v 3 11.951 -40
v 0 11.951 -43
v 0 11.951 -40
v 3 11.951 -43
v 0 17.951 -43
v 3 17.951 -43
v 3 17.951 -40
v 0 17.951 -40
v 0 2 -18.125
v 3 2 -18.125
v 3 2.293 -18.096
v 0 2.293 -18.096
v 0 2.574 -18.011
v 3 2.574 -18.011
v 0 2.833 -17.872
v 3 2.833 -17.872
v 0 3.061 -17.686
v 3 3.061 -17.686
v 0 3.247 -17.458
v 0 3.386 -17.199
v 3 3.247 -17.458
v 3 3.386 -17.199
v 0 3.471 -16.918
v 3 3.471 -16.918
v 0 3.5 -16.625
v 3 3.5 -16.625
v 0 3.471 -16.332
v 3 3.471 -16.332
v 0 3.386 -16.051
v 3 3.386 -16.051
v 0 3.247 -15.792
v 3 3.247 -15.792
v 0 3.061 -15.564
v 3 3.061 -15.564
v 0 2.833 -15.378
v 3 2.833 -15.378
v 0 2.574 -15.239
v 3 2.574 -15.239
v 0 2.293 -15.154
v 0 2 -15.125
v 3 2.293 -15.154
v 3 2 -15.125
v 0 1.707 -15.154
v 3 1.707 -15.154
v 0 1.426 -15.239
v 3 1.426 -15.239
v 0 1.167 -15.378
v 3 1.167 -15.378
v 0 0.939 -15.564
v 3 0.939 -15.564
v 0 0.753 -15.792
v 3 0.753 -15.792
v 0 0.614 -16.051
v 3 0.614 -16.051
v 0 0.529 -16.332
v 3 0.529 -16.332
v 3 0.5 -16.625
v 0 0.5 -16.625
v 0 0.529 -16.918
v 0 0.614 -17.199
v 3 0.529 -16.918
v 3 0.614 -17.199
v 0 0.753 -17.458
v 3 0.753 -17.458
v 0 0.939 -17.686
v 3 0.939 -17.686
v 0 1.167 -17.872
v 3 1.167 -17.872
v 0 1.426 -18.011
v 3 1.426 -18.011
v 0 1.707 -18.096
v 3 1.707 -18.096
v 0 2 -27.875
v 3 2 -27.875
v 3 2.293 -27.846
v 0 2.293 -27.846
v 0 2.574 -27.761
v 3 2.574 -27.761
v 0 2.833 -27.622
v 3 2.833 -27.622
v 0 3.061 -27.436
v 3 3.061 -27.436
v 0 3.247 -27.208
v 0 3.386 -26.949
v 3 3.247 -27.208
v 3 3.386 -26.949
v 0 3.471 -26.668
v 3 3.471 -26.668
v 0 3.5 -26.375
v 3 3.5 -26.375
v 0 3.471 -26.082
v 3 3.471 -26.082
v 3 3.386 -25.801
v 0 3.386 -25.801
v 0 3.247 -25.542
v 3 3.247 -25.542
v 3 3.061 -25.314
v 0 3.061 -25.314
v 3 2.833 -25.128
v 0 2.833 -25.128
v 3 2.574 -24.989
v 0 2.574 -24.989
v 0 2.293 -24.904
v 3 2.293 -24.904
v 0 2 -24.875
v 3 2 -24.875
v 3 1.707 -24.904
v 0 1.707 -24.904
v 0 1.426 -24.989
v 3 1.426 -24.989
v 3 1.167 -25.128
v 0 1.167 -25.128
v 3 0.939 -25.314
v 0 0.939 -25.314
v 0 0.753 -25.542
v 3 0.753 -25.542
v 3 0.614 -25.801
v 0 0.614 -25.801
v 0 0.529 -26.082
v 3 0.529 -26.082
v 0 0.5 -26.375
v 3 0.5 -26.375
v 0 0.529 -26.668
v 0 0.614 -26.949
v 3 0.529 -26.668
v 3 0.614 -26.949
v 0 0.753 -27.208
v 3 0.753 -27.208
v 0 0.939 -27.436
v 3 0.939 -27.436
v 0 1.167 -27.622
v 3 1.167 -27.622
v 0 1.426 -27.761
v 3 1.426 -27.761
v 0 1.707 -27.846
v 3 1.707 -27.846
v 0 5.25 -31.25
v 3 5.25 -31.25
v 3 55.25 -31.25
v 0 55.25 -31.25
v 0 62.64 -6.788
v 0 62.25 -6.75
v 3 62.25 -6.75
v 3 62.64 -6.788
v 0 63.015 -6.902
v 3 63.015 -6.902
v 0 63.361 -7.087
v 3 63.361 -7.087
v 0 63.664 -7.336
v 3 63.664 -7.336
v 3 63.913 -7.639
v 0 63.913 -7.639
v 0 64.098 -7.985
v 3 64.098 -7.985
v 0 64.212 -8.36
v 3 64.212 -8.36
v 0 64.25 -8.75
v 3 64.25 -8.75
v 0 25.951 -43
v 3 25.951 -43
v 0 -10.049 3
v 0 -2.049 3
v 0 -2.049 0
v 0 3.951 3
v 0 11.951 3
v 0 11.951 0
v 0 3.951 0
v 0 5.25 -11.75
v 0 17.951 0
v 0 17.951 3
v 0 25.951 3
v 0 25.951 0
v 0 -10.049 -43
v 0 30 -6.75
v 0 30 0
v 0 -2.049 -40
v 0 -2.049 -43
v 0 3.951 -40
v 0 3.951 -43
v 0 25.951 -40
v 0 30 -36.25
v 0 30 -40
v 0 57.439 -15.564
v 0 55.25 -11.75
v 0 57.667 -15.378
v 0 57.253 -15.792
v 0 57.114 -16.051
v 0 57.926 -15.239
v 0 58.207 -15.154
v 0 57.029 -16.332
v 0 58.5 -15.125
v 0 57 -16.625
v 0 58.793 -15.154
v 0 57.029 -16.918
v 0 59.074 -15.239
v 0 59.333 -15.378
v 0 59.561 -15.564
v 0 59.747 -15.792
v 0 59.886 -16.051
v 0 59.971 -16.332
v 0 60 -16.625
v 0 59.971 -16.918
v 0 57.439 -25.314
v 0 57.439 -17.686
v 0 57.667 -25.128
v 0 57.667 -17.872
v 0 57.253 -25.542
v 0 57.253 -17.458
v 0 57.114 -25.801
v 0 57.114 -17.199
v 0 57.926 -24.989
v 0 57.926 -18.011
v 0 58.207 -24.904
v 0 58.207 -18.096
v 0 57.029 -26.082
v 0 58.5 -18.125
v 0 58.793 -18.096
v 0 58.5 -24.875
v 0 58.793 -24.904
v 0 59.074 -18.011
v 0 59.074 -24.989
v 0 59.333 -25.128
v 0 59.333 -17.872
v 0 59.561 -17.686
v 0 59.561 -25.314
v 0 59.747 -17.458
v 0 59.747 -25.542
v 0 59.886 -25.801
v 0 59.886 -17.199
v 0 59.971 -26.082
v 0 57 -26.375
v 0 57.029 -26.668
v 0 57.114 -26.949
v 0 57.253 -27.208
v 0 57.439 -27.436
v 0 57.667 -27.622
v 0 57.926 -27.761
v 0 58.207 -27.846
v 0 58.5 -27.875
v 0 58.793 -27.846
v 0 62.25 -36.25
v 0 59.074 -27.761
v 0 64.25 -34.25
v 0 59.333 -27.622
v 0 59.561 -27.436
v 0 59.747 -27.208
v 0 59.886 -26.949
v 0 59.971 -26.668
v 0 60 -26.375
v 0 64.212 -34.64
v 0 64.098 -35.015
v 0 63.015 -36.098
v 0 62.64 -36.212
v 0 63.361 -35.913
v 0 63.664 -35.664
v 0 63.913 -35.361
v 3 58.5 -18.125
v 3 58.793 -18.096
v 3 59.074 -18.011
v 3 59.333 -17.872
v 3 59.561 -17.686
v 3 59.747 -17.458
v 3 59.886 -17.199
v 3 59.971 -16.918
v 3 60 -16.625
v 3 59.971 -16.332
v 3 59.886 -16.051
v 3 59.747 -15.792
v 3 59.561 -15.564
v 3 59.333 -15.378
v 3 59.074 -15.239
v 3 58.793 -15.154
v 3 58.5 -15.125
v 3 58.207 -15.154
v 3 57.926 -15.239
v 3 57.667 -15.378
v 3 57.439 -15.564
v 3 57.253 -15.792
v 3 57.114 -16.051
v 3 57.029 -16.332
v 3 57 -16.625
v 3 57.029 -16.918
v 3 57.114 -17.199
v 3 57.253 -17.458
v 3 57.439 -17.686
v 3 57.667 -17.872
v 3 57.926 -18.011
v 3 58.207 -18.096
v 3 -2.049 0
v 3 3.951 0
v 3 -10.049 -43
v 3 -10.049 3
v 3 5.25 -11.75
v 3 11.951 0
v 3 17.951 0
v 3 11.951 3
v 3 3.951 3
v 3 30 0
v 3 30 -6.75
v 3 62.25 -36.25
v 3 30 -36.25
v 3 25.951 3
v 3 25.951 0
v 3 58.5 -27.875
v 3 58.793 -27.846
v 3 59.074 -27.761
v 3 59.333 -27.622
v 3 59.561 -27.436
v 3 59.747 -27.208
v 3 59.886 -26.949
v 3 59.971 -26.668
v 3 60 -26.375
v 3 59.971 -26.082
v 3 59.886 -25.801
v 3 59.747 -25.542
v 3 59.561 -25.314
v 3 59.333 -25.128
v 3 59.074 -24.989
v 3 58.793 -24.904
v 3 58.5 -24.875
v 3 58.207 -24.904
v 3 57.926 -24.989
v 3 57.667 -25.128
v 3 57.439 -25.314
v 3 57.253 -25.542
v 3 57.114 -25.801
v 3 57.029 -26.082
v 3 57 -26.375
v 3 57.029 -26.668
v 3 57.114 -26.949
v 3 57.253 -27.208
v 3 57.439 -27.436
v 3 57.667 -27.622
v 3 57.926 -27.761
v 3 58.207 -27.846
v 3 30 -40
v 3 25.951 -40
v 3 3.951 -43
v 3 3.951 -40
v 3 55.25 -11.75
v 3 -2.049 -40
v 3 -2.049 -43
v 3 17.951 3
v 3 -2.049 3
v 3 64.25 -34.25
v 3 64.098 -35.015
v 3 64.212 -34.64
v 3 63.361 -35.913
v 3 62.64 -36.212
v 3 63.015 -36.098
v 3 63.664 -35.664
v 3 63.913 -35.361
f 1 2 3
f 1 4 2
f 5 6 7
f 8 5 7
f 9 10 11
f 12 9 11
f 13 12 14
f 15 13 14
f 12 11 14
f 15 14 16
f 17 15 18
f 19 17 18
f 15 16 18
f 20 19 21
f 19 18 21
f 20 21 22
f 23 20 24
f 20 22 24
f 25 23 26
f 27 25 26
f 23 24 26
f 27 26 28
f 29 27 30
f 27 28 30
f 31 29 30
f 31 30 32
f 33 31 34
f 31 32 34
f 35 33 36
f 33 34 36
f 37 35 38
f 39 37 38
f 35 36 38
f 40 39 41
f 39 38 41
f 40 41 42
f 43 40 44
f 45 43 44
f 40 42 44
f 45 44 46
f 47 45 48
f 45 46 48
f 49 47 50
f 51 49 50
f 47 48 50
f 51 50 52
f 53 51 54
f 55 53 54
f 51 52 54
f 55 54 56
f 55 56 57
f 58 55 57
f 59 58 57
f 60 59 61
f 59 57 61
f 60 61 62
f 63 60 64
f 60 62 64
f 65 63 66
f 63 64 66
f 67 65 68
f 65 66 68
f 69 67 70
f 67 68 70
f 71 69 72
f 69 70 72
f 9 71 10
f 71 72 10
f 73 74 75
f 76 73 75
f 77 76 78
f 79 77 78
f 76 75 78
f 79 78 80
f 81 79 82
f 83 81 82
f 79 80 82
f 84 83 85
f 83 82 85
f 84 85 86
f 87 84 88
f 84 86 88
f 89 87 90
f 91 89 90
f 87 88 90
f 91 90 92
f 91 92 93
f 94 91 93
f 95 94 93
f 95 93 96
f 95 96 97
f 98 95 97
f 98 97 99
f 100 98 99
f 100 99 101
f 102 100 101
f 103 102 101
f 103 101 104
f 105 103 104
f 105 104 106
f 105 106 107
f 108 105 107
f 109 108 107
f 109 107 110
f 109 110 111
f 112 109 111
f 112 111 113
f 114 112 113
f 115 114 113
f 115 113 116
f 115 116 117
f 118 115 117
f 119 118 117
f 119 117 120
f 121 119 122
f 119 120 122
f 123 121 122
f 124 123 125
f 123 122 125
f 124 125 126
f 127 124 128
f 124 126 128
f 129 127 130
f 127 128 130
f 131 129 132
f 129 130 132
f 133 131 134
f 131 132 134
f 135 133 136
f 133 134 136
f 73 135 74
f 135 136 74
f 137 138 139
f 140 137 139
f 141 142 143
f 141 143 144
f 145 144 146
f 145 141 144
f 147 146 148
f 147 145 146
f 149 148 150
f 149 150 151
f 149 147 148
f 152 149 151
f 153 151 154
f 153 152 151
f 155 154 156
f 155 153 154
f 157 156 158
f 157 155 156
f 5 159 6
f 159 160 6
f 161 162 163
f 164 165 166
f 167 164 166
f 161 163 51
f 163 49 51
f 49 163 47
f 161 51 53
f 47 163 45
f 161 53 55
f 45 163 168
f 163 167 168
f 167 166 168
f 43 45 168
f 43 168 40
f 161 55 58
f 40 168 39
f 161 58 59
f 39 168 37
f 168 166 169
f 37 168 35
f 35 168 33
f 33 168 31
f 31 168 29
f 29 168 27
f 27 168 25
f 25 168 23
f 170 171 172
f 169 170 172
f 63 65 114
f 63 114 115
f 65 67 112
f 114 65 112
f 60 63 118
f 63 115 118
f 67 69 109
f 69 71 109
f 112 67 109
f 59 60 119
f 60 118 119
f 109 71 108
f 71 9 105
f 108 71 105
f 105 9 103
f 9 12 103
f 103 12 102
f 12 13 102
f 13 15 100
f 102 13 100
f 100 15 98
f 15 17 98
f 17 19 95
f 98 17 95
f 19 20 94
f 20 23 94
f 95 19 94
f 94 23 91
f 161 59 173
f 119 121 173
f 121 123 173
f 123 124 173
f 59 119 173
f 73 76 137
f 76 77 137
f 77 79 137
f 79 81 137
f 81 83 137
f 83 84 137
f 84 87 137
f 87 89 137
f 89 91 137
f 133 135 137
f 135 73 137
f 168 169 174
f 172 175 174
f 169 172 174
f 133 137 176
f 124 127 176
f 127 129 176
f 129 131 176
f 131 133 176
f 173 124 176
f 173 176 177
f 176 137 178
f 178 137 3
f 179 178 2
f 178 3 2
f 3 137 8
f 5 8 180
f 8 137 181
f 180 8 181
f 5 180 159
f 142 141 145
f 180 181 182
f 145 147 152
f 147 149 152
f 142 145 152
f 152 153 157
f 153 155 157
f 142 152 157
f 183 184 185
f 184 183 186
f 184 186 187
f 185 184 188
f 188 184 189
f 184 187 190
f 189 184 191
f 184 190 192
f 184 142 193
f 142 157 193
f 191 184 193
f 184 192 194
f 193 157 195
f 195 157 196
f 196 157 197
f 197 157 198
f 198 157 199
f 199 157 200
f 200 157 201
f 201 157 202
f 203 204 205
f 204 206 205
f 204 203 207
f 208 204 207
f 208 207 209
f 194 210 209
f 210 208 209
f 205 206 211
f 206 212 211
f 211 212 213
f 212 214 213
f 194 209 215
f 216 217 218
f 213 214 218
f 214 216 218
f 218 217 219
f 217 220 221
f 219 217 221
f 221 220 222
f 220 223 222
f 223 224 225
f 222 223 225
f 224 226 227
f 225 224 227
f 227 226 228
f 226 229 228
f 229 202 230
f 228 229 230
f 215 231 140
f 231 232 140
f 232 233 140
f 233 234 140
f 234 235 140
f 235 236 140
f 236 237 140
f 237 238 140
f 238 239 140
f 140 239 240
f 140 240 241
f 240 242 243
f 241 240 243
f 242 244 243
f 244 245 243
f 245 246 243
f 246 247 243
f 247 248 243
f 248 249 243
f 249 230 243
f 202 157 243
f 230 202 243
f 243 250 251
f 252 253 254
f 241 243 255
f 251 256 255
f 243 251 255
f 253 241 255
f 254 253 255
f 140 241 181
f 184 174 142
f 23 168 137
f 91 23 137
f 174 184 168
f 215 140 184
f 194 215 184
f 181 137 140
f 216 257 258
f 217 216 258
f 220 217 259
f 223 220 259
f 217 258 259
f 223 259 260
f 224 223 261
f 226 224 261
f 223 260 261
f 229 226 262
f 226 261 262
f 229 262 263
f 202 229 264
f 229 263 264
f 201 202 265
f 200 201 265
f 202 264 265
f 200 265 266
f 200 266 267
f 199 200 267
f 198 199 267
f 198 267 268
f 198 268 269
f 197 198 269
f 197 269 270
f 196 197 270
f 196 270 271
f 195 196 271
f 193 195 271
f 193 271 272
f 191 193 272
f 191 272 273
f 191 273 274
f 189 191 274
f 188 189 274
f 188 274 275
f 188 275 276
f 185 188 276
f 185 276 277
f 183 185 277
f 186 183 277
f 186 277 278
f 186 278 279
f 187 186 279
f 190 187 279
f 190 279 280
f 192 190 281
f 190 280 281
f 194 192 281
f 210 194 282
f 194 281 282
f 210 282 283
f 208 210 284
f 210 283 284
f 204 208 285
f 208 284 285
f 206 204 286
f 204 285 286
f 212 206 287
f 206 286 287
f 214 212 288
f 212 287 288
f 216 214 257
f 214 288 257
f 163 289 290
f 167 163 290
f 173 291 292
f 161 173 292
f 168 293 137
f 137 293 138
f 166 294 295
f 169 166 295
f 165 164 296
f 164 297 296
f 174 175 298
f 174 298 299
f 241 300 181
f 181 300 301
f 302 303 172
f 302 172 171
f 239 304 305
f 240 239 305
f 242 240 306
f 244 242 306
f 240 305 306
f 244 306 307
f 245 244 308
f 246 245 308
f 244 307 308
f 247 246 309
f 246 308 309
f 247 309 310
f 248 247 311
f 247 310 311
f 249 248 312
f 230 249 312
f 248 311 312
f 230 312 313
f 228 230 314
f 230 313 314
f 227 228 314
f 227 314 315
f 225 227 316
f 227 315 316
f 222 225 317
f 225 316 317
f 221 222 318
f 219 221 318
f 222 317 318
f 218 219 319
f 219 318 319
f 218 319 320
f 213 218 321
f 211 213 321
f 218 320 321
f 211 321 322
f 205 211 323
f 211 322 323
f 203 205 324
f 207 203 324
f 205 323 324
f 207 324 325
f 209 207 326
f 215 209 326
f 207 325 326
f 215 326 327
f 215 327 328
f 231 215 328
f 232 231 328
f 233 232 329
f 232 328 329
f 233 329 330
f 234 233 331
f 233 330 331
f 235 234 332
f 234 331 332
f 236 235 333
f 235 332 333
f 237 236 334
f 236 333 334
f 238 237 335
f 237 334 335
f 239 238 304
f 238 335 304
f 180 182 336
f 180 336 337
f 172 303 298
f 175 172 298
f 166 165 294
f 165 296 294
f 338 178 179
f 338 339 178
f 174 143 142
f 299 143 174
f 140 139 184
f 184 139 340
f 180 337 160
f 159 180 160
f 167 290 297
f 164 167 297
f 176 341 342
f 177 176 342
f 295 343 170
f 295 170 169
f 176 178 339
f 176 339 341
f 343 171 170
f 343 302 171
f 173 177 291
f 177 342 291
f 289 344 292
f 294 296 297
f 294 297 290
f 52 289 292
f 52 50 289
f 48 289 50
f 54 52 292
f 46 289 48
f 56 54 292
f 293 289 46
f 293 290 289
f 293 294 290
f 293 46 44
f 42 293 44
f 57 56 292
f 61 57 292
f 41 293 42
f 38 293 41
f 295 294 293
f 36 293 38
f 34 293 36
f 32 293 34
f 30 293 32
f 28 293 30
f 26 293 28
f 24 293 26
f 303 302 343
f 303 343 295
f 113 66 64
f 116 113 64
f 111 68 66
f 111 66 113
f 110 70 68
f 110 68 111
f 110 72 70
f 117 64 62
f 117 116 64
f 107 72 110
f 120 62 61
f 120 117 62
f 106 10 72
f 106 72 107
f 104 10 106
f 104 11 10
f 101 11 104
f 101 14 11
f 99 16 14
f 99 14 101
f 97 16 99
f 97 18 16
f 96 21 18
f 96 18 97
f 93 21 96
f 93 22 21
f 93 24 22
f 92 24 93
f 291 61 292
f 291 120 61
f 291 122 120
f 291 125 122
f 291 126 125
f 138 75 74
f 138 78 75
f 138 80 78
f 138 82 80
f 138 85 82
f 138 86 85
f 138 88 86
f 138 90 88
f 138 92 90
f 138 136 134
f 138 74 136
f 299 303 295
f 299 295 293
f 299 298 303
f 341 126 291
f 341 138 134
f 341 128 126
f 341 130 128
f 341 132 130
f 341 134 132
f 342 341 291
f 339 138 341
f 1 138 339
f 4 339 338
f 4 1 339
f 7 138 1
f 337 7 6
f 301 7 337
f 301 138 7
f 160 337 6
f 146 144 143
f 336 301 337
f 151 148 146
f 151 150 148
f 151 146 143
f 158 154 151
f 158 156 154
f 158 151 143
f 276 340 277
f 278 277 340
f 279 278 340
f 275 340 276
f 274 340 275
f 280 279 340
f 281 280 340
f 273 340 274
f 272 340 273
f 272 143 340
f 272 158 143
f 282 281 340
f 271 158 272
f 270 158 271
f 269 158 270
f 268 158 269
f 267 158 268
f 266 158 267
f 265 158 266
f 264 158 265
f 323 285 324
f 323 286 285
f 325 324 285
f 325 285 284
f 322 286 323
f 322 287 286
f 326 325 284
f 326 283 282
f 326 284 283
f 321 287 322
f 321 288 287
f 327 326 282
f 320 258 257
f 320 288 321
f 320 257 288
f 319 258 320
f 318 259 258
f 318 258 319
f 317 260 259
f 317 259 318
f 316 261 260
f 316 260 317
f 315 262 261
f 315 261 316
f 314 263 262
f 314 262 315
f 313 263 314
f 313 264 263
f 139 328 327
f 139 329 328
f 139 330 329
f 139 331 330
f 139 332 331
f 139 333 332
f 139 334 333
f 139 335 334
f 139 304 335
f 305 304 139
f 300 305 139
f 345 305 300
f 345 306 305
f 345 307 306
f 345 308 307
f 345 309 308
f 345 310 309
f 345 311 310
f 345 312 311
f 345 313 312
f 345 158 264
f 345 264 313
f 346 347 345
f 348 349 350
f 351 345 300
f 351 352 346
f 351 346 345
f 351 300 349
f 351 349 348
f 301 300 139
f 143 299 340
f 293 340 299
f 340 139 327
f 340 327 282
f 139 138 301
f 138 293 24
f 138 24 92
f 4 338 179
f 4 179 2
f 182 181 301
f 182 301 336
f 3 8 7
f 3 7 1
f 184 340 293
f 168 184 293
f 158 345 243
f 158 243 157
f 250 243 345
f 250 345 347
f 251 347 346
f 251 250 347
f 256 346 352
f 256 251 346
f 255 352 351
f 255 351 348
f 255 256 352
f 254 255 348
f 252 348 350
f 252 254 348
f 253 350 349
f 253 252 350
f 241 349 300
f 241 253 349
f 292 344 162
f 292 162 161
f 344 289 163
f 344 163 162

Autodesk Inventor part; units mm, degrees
ref_plane "YZ Plane" through (0, 0, 0) normal (1, 0, 0) x (0, 1, 0)
ref_plane "XZ Plane" through (0, 0, 0) normal (0, 1, 0) x (-1, 0, 0)
ref_plane "XY Plane" through (0, 0, 0) normal (0, 0, 1) x (1, 0, 0)
sketch "Boceto1" plane through (0, 0, 0) normal (1, 0, 0) x (0, 1, 0)
  line L0 (0, 0) -> (0, -3)
  line L1 (0, -3) -> (10, -3)
  line L2 (10, -3) -> (10, 0)
  line L3 (10, 0) -> (20, 0)
  line L4 (20, 0) -> (20, -3)
  line L5 (20, -3) -> (30, -3)
  line L6 (30, -33.4269) -> (30, -40)
  line L7 (30, -40) -> (20, -40)
  line L8 (20, -40) -> (20, -43)
  line L9 (20, -43) -> (10, -43)
  line L10 (10, -43) -> (10, -40)
  line L11 (10, -40) -> (0, -40)
  circle A0 centre (15, -21.5) radius 13.175
  arc A1 (0, -9.5731) -> (0, -33.4269) centre (15, -21.5) ccw
  arc A2 (30, -33.4269) -> (30, -9.5731) centre (15, -21.5) ccw
  line L12 (0, -40) -> (0, -33.4269)
  line L13 (0, -9.5731) -> (0, -3)
  line L14 (30, -3) -> (30, -9.5731)
  dimension "d1" = 10
  dimension "d2" = 10
  dimension "d3" = 10
extrude "Extrusión1" add sketch "Boceto1" along normal blind 3
sketch "Boceto2" plane through (3, 0, 0) normal (1, 0, 0) x (0, 0, -1)
  line L0 (3, 10) -> (3, 0) projected
  line L1 (3, 0) -> (0, 0)
  line L2 (0, 20) -> (0, 10) projected
  line L3 (0, 0) -> (0, 10)
  line L4 (0, 10) -> (-3, 10)
  line L5 (-3, 10) -> (-3, 20)
  line L6 (-3, 20) -> (0, 20)
  line L7 (0, 20) -> (0, 30)
  line L8 (3, 30) -> (3, 20) projected
  line L9 (0, 30) -> (3, 30)
  line L10 (3, 30) -> (3, 20)
  line L11 (3, 20) -> (0, 20) projected
  line L12 (3, 20) -> (0, 20)
  line L13 (0, 20) -> (0, 10)
  line L14 (0, 10) -> (3, 10)
  line L15 (3, 0) -> (3, 10)
  dimension "d11" = 3
extrude "Extrusión2" add sketch "Boceto2" against normal blind 3
sketch "Boceto3" plane through (3, 0, 0) normal (1, 0, 0) x (0, 0, -1)
  line L0 (0, 30) -> (9.5731, 30) projected
  line L1 (0, 30) -> (9.5731, 30)
  line L2 (40, 30) -> (33.4269, 30) projected
  line L3 (9.5731, 30) -> (40, 30)
  line L4 (40, 10) -> (40, 0) projected
  line L5 (40, 30) -> (40, 0)
  line L6 (9.5731, 0) -> (0, 0) projected
  line L7 (40, 0) -> (0, 0)
  line L8 (0, 30) -> (0, 20) projected
  line L9 (0, 0) -> (0, 30)
  circle A0 centre (21.5, 15) radius 26.2155
extrude "Extrusión3" cut sketch "Boceto3" against normal blind 10 contours A0 L6 L7 L4 L5 L2 L3 L0 | L8 L9 A0
sketch "Boceto4" plane through (3, 0, 0) normal (1, 0, 0) x (0, 0, -1)
  circle A0 centre (21.5, 15) radius 13.175 projected
  circle A1 centre (21.5, 15) radius 13.175
  circle A2 centre (21.5, 15) radius 3
  point P0 (0, 0)
extrude "Extrusión4" add sketch "Boceto4" against normal blind 3
sketch "Boceto5" plane through (3, 0, 0) normal (1, 0, 0) x (0, 0, -1)
  line L0 (0, 25.951) -> (-3, 25.951)
  line L1 (-3, 25.951) -> (-3, 17.951)
  line L2 (-3, 17.951) -> (0, 17.951)
  line L3 (0, 25.951) -> (0, 17.951)
  line L4 (-3, 11.951) -> (0, 11.951)
  line L5 (0, 11.951) -> (0, 3.951)
  line L6 (0, 3.951) -> (-3, 3.951)
  line L7 (-3, 3.951) -> (-3, 11.951)
  line L8 (40, 0) -> (0, 0) projected
  line L9 (0, 0) -> (40, 0)
  line L10 (40, 25.951) -> (43, 25.951)
  line L11 (43, 25.951) -> (43, 17.951)
  line L12 (43, 17.951) -> (40, 17.951)
  line L13 (40, 25.951) -> (40, 17.951)
  line L14 (43, 11.951) -> (40, 11.951)
  line L15 (40, 11.951) -> (40, 3.951)
  line L16 (40, 3.951) -> (43, 3.951)
  line L17 (43, 3.951) -> (43, 11.951)
extrude "Extrusión5" add sketch "Boceto5" against normal blind 3
sketch "Boceto6" plane through (3, 0, 0) normal (1, 0, 0) x (0, 0, -1)
  line L0 (31.25, 30) -> (31.25, 55.25)
  line L1 (31.25, 55.25) -> (11.75, 55.25)
  line L2 (11.75, 55.25) -> (11.75, 30)
  line L3 (11.75, 60.25) -> (6.75, 60.25)
  line L4 (31.25, 60.25) -> (36.25, 60.25)
  line L5 (36.25, 60.25) -> (36.25, 30)
  line L6 (31.25, 30) -> (36.25, 30)
  line L7 (31.25, 60.25) -> (11.75, 60.25)
  line L8 (6.75, 60.25) -> (6.75, 30)
  line L9 (6.75, 30) -> (11.75, 30)
  point P0 (0, 0)
  point P1 (21.5, 15)
extrude "Extrusión6" add sketch "Boceto6" against normal blind 3
sketch "Boceto7" plane through (3, 0, 0) normal (1, 0, 0) x (0, 0, -1)
  line L0 (11.75, 30.1448) -> (11.75, 5.25)
  line L1 (11.75, 5.25) -> (31.25, 5.25)
  line L2 (31.25, 5.25) -> (31.25, 30.1448)
  line L3 (31.25, 30.1448) -> (11.75, 30.1448)
  point P0 (0, 0)
  point P1 (21.5, 15)
extrude "Extrusión7" cut sketch "Boceto7" against normal blind 3
sketch "Boceto8" plane through (3, 0, 0) normal (1, 0, 0) x (0, 0, -1)
  line L0 (0, -2.049) -> (-3, -2.049)
  line L1 (-3, -2.049) -> (-3, -10.049)
  line L2 (40, 0) -> (40, -2.049)
  line L3 (40, -2.049) -> (43, -2.049)
  line L4 (43, -2.049) -> (43, -10.049)
  line L5 (43, -10.049) -> (-3, -10.049)
  line L6 (0, 0) -> (0, -2.049)
  line L7 (6.75, 60.25) -> (6.75, 64.25)
  line L8 (36.25, 60.25) -> (36.25, 64.25)
  line L9 (36.25, 64.25) -> (6.75, 64.25)
  line L10 (6.75, 60.25) -> (36.25, 60.25) projected
  line L11 (6.75, 60.25) -> (36.25, 60.25)
  line L12 (40, 0) -> (0, 0) projected
  line L13 (0, 0) -> (40, 0)
  point P0 (0, 3.951)
  dimension "d50" = 4
extrude "Extrusión8" add sketch "Boceto8" against normal blind 3
sketch "Boceto9" plane through (3, 0, 0) normal (1, 0, 0) x (0, 0, -1)
  circle A0 centre (26.375, 58.5) radius 1.5
  circle A1 centre (16.625, 58.5) radius 1.5
  circle A2 centre (26.375, 2) radius 1.5
  circle A3 centre (16.625, 2) radius 1.5
  point P0 (0, 0)
extrude "Extrusión9" cut sketch "Boceto9" against normal blind 3
fillet "Empalme1" radius 2 2 edges at (1.5, 64.25, -6.75) (1.5, 64.25, -36.25)
properties part number "cod"
